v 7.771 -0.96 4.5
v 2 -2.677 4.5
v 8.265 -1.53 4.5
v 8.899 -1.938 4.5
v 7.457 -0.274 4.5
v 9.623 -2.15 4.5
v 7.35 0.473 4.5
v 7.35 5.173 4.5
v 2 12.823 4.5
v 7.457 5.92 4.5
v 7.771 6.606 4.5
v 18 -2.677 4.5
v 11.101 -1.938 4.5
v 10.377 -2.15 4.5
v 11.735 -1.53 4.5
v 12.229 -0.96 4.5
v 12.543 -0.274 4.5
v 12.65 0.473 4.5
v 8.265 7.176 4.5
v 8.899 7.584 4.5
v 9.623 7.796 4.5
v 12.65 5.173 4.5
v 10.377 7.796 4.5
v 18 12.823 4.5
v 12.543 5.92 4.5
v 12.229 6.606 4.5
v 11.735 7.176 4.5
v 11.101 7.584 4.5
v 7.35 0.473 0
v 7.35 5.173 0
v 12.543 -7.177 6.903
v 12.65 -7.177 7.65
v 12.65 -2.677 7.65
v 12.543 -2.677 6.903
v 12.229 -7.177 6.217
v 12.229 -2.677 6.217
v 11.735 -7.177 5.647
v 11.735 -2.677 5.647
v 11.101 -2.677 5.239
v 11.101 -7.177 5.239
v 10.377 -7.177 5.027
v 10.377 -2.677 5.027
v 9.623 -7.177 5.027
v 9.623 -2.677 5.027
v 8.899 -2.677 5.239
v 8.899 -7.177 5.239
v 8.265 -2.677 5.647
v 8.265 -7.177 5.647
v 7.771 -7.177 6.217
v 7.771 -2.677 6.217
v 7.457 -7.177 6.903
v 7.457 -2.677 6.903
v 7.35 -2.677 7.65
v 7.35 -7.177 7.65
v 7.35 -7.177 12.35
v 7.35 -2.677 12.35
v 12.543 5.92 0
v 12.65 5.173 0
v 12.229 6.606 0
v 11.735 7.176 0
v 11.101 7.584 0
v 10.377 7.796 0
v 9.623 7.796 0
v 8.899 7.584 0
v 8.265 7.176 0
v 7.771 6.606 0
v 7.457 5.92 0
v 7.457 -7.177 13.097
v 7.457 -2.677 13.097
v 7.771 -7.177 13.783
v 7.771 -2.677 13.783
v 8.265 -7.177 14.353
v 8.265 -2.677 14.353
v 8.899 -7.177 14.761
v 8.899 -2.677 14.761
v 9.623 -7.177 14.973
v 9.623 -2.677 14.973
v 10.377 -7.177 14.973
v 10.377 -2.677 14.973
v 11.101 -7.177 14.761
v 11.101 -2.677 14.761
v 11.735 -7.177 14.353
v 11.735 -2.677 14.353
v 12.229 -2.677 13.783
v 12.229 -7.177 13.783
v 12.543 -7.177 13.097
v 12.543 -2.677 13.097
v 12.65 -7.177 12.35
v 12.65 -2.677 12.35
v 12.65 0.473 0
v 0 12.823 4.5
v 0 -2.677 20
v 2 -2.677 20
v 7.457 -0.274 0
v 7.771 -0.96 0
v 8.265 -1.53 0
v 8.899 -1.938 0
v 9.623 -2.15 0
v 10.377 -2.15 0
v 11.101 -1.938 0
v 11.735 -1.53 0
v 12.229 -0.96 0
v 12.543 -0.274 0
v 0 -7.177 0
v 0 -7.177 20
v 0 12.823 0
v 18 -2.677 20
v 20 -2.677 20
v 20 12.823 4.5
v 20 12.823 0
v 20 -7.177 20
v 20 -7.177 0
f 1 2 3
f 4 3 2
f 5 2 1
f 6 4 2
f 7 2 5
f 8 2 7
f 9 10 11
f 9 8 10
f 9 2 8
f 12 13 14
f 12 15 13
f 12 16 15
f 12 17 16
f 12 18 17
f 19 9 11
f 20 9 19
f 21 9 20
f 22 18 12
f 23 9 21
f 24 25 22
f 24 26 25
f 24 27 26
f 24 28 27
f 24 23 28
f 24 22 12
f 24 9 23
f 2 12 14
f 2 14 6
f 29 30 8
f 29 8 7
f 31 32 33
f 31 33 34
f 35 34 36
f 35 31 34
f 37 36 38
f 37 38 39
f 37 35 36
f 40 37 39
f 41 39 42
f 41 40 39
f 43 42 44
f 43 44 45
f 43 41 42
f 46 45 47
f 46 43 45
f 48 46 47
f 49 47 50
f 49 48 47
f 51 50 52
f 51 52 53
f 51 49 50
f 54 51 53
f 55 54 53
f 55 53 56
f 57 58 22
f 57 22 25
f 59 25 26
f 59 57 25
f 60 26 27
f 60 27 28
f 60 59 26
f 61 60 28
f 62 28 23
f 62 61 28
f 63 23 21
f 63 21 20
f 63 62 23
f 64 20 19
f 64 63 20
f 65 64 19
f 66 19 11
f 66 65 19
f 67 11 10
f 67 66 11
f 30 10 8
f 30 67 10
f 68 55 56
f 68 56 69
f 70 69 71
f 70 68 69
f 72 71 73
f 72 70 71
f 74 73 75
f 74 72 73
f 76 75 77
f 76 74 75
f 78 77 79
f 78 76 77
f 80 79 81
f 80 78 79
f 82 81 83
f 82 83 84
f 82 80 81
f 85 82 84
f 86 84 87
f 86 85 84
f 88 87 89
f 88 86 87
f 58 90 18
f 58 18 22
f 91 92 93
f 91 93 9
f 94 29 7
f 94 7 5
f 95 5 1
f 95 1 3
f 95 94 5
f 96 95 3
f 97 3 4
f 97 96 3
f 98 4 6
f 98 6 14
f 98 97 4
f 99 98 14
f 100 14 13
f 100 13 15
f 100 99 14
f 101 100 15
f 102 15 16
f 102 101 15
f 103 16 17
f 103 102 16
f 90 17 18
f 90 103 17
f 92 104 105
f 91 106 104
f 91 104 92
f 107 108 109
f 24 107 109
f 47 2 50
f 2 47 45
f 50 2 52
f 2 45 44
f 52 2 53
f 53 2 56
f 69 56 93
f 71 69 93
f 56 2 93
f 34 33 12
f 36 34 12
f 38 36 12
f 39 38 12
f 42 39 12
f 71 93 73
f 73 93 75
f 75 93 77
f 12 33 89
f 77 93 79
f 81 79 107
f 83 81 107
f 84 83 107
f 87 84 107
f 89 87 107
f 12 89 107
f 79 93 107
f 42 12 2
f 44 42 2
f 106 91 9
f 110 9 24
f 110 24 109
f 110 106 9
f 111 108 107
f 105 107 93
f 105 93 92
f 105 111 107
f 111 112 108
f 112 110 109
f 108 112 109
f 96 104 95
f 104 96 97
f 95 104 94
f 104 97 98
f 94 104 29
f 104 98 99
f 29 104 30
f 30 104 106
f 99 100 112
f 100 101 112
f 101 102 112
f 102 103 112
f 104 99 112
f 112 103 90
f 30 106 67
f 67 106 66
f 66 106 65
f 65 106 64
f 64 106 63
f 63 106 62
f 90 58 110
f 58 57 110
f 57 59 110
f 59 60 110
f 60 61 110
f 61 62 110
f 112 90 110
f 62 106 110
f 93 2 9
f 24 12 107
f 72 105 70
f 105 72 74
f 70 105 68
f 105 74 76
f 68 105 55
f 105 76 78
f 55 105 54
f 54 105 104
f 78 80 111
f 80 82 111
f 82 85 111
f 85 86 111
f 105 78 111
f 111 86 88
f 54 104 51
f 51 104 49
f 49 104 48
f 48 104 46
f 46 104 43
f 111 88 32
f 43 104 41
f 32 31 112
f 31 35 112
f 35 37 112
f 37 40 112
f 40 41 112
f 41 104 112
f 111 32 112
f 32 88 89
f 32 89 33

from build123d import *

# Parameters (mm, degrees)
SKETCH1_W           = 20
SKETCH1_H           = 20
BOSS_EXTRUDE1_DEPTH = 4.5
SKETCH2_W           = 20
SKETCH2_H           = 4.5
BOSS_EXTRUDE2_DEPTH = 4.5
BOSS_EXTRUDE3_DEPTH = 2


with BuildPart() as part:
    # Sketch1 → Boss-Extrude1 (new body)
    with BuildSketch(Plane.XY):
        with Locations((10, 2.82300885)):
            Rectangle(SKETCH1_W, SKETCH1_H)
        with BuildLine():
            Line((7.35, 5.17300885), (7.35, 0.47300885))
            ThreePointArc((7.35, 0.47300885), (10, -2.17699115), (12.65, 0.47300885))
            Line((12.65, 0.47300885), (12.65, 5.17300885))
            ThreePointArc((12.65, 5.17300885), (10, 7.82300885), (7.35, 5.17300885))
        make_face(mode=Mode.SUBTRACT)
    extrude(amount=BOSS_EXTRUDE1_DEPTH)

    # Sketch2 → Boss-Extrude2 (add)
    with BuildSketch(Plane.XZ.offset(7.17699115)):
        with Locations((10, 2.25)):
            Rectangle(SKETCH2_W, SKETCH2_H)
        with BuildLine():
            Line((0, 10), (0, 4.5))
            Line((0, 4.5), (20, 4.5))
            Line((20, 4.5), (20, 10))
            Line((20, 10), (12.65, 10))
            Line((12.65, 10), (12.65, 7.65))
            ThreePointArc((12.65, 7.65), (10, 5), (7.35, 7.65))
            Line((7.35, 7.65), (7.35, 10))
            Line((7.35, 10), (0, 10))
        make_face()
        with BuildLine():
            Line((0, 20), (0, 10))
            Line((0, 10), (7.35, 10))
            Line((7.35, 10), (7.35, 12.35))
            ThreePointArc((7.35, 12.35), (10, 15), (12.65, 12.35))
            Line((12.65, 12.35), (12.65, 10))
            Line((12.65, 10), (20, 10))
            Line((20, 10), (20, 20))
            Line((20, 20), (0, 20))
        make_face()
    extrude(amount=-BOSS_EXTRUDE2_DEPTH)

    # Sketch4 → Boss-Extrude3 (add)
    with BuildSketch(Plane(origin=(20, 0, 0), x_dir=(0, 0, -1), z_dir=(1, 0, 0))):
        Polygon((-20, -2.67699115), (-4.5, 12.82300885), (-4.5, -2.67699115), align=None)
    boss_extrude3 = extrude(amount=-BOSS_EXTRUDE3_DEPTH)

    # Mirror1: Boss-Extrude3 across plane
    add(boss_extrude3.mirror(Plane(origin=(10, 0, 0), x_dir=(0, 0, 1), z_dir=(1, 0, 0))))


solid = part.part
